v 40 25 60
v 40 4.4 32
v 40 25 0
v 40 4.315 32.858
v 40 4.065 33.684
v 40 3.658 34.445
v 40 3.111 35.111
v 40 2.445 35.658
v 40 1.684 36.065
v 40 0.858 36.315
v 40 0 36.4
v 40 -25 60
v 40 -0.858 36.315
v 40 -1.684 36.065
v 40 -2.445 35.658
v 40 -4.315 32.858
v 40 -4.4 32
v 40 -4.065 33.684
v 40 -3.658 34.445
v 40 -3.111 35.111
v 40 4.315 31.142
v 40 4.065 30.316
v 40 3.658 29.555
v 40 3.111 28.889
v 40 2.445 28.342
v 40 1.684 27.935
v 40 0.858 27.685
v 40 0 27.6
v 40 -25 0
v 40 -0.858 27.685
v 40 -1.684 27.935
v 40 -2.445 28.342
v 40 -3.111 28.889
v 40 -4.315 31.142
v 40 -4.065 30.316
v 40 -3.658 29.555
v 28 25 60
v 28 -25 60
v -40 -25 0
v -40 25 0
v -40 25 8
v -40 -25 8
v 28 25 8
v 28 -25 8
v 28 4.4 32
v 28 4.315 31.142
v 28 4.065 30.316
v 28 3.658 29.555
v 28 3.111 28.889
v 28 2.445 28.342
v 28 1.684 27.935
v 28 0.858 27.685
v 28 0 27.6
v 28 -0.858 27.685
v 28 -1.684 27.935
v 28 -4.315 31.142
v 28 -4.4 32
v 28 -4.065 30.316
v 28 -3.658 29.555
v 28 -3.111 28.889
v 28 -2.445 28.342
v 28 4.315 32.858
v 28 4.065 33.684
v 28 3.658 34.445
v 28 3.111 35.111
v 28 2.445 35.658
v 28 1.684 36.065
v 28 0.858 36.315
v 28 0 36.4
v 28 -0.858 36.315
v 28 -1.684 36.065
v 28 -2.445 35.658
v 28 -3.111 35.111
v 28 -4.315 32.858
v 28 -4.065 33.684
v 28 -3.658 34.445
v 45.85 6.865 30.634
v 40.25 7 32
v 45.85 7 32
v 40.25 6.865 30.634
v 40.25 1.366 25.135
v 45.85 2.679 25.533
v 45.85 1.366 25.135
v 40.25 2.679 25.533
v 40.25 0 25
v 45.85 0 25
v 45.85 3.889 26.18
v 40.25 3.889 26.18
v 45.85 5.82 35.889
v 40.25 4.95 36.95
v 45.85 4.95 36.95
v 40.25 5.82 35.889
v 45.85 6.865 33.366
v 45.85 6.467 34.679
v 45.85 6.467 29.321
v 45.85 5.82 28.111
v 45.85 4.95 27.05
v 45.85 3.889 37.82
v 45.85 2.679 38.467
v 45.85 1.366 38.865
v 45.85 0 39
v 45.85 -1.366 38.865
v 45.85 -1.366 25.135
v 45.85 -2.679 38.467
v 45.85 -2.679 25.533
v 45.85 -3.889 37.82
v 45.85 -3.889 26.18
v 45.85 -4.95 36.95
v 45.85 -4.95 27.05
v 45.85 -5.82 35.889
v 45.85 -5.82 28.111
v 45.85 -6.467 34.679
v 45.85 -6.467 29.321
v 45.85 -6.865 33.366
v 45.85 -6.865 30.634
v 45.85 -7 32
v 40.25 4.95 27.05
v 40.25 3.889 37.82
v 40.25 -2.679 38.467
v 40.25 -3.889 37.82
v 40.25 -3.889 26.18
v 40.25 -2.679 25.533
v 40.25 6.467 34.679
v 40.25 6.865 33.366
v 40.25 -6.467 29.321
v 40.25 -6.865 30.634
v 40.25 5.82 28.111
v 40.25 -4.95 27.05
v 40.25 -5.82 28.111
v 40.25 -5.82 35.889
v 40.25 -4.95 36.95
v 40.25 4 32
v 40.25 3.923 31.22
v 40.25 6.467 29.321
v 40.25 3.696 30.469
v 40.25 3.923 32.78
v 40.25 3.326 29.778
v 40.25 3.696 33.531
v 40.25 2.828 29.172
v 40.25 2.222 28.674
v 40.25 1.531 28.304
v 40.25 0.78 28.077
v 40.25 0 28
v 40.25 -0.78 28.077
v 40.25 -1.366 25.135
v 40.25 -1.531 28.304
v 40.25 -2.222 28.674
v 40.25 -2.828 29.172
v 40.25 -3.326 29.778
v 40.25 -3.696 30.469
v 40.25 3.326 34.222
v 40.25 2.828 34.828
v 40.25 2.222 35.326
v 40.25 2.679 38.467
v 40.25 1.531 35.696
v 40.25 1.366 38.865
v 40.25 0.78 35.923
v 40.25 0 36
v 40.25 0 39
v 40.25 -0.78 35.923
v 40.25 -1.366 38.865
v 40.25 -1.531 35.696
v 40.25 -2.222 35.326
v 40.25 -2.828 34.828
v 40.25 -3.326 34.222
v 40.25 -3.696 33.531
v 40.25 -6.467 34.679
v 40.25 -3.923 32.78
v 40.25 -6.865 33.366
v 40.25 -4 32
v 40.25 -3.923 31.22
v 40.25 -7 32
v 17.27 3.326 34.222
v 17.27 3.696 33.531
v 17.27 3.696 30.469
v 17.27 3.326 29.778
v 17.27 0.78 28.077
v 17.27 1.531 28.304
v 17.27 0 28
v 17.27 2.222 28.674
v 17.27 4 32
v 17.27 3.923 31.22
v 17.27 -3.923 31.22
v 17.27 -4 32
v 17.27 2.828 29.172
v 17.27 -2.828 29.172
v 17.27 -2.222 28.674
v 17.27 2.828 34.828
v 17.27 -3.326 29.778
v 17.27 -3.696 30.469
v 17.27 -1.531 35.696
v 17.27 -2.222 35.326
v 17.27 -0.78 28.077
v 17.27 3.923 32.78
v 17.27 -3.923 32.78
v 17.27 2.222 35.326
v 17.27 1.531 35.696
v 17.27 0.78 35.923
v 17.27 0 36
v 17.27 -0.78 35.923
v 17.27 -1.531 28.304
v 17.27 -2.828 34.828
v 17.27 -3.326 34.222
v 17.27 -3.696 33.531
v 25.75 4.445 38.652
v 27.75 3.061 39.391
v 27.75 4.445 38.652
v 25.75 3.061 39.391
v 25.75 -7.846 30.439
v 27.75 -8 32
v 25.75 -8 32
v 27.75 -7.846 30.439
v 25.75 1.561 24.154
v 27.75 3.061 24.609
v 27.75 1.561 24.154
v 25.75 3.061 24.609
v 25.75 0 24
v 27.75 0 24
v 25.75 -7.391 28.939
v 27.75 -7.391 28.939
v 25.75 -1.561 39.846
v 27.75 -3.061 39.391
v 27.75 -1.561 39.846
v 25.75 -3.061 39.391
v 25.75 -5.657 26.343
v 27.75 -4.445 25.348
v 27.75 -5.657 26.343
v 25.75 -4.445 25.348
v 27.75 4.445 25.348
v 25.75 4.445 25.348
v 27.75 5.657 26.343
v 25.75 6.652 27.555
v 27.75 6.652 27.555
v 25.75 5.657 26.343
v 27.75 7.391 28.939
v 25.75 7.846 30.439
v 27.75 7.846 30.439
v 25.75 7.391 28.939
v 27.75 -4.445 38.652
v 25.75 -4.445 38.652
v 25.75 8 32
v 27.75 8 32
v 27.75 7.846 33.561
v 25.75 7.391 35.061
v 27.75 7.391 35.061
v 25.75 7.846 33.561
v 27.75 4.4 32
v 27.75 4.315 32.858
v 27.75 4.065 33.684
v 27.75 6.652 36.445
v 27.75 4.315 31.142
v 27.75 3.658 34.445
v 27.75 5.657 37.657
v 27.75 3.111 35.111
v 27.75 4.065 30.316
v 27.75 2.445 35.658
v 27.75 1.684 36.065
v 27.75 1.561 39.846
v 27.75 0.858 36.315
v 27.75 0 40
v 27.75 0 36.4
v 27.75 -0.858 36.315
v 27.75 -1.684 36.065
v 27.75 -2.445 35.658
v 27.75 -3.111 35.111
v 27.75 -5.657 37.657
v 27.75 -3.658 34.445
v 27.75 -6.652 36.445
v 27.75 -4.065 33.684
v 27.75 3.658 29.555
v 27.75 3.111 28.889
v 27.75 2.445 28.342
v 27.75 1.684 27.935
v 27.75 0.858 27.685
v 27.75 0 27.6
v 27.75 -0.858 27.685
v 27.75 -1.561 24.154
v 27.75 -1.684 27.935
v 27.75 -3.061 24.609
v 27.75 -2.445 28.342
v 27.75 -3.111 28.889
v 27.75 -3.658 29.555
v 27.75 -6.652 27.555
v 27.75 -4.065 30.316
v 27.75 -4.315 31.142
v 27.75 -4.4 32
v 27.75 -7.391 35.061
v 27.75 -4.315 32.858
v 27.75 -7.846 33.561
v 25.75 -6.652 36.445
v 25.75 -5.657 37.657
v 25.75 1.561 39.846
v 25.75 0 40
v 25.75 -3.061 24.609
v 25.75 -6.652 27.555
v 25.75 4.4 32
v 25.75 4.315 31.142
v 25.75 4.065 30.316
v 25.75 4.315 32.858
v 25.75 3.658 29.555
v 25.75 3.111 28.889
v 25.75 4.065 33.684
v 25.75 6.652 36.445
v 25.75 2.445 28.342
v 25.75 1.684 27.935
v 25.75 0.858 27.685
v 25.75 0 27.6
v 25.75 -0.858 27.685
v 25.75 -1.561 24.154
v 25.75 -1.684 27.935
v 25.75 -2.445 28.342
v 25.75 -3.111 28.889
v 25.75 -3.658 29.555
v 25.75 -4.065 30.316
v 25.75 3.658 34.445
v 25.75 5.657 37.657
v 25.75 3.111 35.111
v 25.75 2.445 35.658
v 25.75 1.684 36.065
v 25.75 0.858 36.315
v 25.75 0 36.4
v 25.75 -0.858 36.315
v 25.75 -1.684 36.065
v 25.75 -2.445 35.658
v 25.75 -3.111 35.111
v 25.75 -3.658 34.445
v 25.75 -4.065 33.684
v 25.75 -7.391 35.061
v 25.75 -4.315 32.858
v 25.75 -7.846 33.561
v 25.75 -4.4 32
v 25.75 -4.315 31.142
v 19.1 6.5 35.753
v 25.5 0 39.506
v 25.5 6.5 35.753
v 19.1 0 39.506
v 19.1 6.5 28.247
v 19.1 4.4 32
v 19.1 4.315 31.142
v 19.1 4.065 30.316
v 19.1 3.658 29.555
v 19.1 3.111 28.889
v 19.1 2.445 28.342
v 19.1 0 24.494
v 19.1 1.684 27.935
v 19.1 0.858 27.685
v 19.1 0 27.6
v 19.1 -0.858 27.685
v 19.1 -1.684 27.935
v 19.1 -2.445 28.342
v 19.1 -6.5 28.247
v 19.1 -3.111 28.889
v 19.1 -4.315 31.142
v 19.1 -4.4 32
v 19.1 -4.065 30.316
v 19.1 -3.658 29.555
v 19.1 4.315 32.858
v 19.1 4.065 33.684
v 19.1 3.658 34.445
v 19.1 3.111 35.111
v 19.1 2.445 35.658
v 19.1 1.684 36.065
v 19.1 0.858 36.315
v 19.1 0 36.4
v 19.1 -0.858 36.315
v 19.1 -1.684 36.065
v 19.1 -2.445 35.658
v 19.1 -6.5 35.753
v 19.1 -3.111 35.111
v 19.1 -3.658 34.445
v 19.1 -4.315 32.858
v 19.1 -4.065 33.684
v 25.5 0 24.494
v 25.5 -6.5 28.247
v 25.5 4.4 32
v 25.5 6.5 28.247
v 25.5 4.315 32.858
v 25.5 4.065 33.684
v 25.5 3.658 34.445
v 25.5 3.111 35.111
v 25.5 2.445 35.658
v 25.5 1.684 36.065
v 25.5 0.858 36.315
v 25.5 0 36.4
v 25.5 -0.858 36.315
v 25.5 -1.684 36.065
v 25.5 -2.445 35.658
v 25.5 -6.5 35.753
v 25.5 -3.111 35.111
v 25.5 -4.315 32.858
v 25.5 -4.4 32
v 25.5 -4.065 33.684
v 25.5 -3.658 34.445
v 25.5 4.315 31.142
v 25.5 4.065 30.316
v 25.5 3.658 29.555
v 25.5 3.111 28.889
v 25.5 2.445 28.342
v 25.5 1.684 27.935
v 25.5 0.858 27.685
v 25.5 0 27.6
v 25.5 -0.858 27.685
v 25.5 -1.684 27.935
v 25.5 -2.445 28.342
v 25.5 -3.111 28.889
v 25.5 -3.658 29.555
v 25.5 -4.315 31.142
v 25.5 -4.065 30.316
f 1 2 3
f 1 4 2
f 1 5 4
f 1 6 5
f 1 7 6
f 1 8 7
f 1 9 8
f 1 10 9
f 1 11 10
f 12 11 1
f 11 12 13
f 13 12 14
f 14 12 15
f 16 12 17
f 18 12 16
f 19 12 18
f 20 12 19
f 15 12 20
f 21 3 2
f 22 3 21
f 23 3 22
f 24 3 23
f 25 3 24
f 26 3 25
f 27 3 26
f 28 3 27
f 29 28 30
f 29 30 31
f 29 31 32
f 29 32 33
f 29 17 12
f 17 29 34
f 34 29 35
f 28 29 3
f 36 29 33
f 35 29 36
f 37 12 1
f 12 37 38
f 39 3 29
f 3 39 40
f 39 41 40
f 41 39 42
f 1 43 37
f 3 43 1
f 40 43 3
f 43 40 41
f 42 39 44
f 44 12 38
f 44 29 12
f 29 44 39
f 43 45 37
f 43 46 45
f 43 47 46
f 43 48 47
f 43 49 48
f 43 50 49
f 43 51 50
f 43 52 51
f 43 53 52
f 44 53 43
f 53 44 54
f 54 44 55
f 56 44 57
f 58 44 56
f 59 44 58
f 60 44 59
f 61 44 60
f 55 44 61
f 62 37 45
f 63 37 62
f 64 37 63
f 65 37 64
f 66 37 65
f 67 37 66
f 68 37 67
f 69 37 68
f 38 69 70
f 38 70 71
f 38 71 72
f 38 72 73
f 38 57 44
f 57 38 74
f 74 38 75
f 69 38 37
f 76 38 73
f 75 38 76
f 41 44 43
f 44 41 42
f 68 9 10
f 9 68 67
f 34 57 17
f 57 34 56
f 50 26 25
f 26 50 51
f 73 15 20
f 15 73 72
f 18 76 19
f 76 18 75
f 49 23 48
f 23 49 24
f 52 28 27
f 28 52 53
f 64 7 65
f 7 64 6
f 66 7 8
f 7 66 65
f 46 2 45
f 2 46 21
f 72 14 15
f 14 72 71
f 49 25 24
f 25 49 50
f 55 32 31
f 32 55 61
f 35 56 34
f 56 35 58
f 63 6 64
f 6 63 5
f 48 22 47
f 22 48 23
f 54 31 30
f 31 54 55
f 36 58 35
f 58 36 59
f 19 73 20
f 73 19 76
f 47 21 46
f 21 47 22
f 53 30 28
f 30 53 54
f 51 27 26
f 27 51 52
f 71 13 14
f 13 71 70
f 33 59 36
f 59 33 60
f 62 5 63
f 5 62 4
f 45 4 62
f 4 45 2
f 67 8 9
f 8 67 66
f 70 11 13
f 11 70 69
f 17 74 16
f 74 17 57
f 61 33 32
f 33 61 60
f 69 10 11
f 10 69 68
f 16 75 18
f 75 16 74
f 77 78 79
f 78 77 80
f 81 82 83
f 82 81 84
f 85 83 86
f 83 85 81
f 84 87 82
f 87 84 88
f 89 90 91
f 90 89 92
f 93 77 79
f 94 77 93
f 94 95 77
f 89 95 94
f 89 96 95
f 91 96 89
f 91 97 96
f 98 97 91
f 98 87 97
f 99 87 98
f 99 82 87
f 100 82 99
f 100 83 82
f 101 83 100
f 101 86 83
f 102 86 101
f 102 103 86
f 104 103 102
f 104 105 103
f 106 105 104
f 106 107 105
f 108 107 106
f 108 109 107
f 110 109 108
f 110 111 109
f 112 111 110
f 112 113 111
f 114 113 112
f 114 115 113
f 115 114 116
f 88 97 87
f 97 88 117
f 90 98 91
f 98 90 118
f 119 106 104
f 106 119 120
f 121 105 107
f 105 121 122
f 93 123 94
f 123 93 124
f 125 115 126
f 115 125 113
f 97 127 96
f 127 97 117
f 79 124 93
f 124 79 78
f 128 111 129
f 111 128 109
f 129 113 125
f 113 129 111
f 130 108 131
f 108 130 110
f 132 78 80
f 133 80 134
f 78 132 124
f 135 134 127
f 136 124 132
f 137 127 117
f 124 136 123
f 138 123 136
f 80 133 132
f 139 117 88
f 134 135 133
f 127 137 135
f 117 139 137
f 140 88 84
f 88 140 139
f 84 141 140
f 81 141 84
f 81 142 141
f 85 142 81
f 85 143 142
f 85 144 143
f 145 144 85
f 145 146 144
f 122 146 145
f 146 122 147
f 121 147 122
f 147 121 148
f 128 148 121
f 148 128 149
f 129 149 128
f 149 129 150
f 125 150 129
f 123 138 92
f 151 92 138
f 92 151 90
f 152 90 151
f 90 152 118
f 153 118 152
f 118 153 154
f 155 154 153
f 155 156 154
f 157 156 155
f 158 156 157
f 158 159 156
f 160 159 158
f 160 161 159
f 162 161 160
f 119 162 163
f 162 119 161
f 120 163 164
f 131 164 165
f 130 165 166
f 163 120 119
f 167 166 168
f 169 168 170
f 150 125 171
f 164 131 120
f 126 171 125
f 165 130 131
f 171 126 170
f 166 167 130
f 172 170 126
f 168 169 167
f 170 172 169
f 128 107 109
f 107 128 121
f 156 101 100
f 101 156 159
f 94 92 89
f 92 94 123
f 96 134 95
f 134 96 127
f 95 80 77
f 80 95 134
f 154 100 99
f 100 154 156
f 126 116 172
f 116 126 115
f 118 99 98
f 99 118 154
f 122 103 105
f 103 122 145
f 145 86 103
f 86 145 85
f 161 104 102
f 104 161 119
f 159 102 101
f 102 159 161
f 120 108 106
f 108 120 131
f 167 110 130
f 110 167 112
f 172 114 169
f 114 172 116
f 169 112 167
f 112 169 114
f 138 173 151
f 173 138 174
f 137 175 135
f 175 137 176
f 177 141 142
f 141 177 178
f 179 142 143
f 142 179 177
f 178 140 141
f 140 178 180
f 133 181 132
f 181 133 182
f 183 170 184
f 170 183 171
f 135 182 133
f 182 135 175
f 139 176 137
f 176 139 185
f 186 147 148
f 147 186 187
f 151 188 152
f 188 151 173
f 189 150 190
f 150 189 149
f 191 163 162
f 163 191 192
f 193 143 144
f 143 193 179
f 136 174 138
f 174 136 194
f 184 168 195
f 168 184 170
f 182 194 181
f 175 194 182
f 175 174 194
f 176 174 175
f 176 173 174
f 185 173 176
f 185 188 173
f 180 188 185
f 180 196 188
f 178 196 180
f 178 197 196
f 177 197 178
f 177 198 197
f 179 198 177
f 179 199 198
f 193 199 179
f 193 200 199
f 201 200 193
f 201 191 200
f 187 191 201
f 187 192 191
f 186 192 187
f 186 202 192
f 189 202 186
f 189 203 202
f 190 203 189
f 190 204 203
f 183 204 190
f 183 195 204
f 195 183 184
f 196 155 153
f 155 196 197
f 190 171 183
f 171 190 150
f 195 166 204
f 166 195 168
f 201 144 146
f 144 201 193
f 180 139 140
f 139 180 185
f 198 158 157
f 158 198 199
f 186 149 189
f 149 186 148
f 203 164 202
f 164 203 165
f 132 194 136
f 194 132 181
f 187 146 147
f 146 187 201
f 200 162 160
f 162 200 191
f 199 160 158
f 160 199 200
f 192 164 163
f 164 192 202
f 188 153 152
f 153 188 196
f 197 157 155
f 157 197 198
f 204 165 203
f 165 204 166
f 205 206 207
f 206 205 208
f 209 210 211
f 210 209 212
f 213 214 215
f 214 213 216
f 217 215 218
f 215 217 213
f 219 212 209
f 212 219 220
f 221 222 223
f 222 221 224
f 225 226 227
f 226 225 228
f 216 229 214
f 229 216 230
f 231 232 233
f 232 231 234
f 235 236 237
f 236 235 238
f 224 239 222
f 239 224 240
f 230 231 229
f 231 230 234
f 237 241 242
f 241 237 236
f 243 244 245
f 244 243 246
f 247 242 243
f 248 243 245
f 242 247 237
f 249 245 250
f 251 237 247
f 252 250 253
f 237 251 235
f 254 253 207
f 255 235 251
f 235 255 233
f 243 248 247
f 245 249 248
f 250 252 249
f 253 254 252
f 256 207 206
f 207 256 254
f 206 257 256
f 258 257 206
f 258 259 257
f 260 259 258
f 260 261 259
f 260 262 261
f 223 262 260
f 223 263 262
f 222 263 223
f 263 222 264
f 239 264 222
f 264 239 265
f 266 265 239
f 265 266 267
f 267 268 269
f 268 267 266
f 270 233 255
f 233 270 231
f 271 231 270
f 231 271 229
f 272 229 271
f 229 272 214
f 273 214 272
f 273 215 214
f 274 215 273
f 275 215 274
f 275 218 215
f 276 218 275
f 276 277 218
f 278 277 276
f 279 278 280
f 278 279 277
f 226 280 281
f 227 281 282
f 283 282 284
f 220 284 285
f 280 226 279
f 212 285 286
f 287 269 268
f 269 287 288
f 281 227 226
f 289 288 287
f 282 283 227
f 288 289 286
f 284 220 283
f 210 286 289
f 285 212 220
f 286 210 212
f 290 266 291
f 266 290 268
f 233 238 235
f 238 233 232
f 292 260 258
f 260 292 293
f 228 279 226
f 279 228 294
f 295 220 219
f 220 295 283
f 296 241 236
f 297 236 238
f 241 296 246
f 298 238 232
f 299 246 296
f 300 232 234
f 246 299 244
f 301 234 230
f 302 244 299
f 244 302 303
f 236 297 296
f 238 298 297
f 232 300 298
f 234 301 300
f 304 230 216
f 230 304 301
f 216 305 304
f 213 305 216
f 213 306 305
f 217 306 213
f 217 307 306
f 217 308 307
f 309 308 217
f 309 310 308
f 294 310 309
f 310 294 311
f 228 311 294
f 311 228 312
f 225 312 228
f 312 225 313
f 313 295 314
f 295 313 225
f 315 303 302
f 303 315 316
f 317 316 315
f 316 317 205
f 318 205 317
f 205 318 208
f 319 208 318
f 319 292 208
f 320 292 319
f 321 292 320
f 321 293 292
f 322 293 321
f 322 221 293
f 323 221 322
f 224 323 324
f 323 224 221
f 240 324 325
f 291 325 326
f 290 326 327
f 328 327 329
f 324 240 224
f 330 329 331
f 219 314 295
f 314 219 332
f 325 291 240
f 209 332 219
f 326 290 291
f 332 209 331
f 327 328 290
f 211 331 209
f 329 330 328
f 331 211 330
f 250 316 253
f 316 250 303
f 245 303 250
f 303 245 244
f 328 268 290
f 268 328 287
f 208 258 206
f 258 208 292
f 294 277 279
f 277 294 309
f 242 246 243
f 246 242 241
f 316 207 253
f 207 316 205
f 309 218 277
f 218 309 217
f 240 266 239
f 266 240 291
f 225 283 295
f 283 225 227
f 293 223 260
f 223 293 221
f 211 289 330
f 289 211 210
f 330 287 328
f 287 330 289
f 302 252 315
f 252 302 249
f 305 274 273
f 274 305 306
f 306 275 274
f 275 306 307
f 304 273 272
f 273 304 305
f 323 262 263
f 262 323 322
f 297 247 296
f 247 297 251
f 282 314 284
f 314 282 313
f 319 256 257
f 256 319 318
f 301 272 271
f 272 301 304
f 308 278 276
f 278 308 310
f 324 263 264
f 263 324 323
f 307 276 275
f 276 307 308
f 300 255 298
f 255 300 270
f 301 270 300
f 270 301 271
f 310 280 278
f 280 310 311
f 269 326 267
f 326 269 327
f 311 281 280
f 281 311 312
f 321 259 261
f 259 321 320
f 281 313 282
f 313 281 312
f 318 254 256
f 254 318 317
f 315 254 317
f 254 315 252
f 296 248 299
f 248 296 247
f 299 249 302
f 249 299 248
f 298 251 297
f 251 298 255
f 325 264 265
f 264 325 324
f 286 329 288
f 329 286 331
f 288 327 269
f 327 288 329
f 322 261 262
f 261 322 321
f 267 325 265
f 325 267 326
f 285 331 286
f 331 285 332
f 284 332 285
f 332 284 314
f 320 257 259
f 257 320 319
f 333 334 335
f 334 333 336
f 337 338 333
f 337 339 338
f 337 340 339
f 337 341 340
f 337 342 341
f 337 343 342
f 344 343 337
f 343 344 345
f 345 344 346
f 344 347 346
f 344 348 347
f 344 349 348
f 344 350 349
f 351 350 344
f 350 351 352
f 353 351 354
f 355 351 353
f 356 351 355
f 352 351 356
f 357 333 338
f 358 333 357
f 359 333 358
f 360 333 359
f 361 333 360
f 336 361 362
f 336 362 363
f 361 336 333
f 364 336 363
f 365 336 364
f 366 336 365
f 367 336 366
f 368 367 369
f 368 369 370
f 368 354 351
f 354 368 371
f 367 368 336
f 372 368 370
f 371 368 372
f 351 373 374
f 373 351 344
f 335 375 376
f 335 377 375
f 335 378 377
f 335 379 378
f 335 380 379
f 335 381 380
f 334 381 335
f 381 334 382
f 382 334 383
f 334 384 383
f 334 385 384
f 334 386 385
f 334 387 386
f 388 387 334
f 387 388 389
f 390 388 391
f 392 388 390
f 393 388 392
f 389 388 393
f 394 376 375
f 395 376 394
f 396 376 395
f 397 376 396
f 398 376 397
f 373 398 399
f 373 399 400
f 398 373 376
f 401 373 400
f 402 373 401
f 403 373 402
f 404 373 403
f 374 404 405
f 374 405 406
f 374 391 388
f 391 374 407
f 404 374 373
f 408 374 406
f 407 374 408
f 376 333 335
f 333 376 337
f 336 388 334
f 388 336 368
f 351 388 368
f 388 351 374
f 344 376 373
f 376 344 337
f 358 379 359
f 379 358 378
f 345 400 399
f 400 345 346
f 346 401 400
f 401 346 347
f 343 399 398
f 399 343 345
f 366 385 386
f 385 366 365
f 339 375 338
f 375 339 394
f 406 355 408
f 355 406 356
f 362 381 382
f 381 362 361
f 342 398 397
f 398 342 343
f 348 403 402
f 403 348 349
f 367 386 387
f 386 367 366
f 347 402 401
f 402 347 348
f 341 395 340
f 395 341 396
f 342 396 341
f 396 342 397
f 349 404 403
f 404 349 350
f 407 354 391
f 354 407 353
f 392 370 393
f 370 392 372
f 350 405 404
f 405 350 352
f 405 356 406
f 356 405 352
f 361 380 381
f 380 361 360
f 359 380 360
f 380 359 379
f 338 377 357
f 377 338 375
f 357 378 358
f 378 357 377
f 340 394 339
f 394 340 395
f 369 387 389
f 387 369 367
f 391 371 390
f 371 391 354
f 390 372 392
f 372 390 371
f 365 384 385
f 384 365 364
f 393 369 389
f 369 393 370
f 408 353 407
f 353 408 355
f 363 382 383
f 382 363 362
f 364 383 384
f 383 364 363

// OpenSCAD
$fn = 32;

// ------------------------------------------------------------------------
// Bolted bracket: 80 x 50 mm bracket with 1 bolt joints
// Every part is its own module, assembly() places them once.
// ------------------------------------------------------------------------

// --- part 1 ---
module bracket() {
  difference() {
    translate([-40, -25, 0]) cube([80, 50, 60]);
    translate([-41, -26, 8]) cube([69, 52, 53]);
    translate([34, 0, 32]) rotate([0, 90, 0]) cylinder(h = 14, d = 8.8, center = true);
  }
}

// --- part 2 ---
module bolt() {
  cylinder(h = 5.6, d = 14);
  translate([0, 0, -22.98]) cylinder(h = 22.98, d = 8);
}

// --- part 3 ---
module washer() {
  difference() {
      translate([0, 0, 0]) cylinder(h = 2, d = 16);
      translate([0, 0, -1]) cylinder(h = 4, d = 8.8);
    }
}

// --- part 4 ---
module nut() {
  difference() {
    linear_extrude(height = 6.4) polygon(points = [[7.506, 0], [3.753, 6.5], [-3.753, 6.5], [-7.506, 0], [-3.753, -6.5], [3.753, -6.5]]);
    translate([0, 0, -1]) cylinder(h = 8.4, d = 8.8);
  }
}

// --- assembly ---
module assembly() {
  translate([0, 0, 0]) rotate([0, 0, 0]) bracket();
  translate([40.25, 0, 32]) rotate([0, 90, 0]) bolt();
  translate([25.75, 0, 32]) rotate([0, 90, 0]) washer();
  translate([19.1, 0, 32]) rotate([0, 90, 0]) nut();
}

assembly();
